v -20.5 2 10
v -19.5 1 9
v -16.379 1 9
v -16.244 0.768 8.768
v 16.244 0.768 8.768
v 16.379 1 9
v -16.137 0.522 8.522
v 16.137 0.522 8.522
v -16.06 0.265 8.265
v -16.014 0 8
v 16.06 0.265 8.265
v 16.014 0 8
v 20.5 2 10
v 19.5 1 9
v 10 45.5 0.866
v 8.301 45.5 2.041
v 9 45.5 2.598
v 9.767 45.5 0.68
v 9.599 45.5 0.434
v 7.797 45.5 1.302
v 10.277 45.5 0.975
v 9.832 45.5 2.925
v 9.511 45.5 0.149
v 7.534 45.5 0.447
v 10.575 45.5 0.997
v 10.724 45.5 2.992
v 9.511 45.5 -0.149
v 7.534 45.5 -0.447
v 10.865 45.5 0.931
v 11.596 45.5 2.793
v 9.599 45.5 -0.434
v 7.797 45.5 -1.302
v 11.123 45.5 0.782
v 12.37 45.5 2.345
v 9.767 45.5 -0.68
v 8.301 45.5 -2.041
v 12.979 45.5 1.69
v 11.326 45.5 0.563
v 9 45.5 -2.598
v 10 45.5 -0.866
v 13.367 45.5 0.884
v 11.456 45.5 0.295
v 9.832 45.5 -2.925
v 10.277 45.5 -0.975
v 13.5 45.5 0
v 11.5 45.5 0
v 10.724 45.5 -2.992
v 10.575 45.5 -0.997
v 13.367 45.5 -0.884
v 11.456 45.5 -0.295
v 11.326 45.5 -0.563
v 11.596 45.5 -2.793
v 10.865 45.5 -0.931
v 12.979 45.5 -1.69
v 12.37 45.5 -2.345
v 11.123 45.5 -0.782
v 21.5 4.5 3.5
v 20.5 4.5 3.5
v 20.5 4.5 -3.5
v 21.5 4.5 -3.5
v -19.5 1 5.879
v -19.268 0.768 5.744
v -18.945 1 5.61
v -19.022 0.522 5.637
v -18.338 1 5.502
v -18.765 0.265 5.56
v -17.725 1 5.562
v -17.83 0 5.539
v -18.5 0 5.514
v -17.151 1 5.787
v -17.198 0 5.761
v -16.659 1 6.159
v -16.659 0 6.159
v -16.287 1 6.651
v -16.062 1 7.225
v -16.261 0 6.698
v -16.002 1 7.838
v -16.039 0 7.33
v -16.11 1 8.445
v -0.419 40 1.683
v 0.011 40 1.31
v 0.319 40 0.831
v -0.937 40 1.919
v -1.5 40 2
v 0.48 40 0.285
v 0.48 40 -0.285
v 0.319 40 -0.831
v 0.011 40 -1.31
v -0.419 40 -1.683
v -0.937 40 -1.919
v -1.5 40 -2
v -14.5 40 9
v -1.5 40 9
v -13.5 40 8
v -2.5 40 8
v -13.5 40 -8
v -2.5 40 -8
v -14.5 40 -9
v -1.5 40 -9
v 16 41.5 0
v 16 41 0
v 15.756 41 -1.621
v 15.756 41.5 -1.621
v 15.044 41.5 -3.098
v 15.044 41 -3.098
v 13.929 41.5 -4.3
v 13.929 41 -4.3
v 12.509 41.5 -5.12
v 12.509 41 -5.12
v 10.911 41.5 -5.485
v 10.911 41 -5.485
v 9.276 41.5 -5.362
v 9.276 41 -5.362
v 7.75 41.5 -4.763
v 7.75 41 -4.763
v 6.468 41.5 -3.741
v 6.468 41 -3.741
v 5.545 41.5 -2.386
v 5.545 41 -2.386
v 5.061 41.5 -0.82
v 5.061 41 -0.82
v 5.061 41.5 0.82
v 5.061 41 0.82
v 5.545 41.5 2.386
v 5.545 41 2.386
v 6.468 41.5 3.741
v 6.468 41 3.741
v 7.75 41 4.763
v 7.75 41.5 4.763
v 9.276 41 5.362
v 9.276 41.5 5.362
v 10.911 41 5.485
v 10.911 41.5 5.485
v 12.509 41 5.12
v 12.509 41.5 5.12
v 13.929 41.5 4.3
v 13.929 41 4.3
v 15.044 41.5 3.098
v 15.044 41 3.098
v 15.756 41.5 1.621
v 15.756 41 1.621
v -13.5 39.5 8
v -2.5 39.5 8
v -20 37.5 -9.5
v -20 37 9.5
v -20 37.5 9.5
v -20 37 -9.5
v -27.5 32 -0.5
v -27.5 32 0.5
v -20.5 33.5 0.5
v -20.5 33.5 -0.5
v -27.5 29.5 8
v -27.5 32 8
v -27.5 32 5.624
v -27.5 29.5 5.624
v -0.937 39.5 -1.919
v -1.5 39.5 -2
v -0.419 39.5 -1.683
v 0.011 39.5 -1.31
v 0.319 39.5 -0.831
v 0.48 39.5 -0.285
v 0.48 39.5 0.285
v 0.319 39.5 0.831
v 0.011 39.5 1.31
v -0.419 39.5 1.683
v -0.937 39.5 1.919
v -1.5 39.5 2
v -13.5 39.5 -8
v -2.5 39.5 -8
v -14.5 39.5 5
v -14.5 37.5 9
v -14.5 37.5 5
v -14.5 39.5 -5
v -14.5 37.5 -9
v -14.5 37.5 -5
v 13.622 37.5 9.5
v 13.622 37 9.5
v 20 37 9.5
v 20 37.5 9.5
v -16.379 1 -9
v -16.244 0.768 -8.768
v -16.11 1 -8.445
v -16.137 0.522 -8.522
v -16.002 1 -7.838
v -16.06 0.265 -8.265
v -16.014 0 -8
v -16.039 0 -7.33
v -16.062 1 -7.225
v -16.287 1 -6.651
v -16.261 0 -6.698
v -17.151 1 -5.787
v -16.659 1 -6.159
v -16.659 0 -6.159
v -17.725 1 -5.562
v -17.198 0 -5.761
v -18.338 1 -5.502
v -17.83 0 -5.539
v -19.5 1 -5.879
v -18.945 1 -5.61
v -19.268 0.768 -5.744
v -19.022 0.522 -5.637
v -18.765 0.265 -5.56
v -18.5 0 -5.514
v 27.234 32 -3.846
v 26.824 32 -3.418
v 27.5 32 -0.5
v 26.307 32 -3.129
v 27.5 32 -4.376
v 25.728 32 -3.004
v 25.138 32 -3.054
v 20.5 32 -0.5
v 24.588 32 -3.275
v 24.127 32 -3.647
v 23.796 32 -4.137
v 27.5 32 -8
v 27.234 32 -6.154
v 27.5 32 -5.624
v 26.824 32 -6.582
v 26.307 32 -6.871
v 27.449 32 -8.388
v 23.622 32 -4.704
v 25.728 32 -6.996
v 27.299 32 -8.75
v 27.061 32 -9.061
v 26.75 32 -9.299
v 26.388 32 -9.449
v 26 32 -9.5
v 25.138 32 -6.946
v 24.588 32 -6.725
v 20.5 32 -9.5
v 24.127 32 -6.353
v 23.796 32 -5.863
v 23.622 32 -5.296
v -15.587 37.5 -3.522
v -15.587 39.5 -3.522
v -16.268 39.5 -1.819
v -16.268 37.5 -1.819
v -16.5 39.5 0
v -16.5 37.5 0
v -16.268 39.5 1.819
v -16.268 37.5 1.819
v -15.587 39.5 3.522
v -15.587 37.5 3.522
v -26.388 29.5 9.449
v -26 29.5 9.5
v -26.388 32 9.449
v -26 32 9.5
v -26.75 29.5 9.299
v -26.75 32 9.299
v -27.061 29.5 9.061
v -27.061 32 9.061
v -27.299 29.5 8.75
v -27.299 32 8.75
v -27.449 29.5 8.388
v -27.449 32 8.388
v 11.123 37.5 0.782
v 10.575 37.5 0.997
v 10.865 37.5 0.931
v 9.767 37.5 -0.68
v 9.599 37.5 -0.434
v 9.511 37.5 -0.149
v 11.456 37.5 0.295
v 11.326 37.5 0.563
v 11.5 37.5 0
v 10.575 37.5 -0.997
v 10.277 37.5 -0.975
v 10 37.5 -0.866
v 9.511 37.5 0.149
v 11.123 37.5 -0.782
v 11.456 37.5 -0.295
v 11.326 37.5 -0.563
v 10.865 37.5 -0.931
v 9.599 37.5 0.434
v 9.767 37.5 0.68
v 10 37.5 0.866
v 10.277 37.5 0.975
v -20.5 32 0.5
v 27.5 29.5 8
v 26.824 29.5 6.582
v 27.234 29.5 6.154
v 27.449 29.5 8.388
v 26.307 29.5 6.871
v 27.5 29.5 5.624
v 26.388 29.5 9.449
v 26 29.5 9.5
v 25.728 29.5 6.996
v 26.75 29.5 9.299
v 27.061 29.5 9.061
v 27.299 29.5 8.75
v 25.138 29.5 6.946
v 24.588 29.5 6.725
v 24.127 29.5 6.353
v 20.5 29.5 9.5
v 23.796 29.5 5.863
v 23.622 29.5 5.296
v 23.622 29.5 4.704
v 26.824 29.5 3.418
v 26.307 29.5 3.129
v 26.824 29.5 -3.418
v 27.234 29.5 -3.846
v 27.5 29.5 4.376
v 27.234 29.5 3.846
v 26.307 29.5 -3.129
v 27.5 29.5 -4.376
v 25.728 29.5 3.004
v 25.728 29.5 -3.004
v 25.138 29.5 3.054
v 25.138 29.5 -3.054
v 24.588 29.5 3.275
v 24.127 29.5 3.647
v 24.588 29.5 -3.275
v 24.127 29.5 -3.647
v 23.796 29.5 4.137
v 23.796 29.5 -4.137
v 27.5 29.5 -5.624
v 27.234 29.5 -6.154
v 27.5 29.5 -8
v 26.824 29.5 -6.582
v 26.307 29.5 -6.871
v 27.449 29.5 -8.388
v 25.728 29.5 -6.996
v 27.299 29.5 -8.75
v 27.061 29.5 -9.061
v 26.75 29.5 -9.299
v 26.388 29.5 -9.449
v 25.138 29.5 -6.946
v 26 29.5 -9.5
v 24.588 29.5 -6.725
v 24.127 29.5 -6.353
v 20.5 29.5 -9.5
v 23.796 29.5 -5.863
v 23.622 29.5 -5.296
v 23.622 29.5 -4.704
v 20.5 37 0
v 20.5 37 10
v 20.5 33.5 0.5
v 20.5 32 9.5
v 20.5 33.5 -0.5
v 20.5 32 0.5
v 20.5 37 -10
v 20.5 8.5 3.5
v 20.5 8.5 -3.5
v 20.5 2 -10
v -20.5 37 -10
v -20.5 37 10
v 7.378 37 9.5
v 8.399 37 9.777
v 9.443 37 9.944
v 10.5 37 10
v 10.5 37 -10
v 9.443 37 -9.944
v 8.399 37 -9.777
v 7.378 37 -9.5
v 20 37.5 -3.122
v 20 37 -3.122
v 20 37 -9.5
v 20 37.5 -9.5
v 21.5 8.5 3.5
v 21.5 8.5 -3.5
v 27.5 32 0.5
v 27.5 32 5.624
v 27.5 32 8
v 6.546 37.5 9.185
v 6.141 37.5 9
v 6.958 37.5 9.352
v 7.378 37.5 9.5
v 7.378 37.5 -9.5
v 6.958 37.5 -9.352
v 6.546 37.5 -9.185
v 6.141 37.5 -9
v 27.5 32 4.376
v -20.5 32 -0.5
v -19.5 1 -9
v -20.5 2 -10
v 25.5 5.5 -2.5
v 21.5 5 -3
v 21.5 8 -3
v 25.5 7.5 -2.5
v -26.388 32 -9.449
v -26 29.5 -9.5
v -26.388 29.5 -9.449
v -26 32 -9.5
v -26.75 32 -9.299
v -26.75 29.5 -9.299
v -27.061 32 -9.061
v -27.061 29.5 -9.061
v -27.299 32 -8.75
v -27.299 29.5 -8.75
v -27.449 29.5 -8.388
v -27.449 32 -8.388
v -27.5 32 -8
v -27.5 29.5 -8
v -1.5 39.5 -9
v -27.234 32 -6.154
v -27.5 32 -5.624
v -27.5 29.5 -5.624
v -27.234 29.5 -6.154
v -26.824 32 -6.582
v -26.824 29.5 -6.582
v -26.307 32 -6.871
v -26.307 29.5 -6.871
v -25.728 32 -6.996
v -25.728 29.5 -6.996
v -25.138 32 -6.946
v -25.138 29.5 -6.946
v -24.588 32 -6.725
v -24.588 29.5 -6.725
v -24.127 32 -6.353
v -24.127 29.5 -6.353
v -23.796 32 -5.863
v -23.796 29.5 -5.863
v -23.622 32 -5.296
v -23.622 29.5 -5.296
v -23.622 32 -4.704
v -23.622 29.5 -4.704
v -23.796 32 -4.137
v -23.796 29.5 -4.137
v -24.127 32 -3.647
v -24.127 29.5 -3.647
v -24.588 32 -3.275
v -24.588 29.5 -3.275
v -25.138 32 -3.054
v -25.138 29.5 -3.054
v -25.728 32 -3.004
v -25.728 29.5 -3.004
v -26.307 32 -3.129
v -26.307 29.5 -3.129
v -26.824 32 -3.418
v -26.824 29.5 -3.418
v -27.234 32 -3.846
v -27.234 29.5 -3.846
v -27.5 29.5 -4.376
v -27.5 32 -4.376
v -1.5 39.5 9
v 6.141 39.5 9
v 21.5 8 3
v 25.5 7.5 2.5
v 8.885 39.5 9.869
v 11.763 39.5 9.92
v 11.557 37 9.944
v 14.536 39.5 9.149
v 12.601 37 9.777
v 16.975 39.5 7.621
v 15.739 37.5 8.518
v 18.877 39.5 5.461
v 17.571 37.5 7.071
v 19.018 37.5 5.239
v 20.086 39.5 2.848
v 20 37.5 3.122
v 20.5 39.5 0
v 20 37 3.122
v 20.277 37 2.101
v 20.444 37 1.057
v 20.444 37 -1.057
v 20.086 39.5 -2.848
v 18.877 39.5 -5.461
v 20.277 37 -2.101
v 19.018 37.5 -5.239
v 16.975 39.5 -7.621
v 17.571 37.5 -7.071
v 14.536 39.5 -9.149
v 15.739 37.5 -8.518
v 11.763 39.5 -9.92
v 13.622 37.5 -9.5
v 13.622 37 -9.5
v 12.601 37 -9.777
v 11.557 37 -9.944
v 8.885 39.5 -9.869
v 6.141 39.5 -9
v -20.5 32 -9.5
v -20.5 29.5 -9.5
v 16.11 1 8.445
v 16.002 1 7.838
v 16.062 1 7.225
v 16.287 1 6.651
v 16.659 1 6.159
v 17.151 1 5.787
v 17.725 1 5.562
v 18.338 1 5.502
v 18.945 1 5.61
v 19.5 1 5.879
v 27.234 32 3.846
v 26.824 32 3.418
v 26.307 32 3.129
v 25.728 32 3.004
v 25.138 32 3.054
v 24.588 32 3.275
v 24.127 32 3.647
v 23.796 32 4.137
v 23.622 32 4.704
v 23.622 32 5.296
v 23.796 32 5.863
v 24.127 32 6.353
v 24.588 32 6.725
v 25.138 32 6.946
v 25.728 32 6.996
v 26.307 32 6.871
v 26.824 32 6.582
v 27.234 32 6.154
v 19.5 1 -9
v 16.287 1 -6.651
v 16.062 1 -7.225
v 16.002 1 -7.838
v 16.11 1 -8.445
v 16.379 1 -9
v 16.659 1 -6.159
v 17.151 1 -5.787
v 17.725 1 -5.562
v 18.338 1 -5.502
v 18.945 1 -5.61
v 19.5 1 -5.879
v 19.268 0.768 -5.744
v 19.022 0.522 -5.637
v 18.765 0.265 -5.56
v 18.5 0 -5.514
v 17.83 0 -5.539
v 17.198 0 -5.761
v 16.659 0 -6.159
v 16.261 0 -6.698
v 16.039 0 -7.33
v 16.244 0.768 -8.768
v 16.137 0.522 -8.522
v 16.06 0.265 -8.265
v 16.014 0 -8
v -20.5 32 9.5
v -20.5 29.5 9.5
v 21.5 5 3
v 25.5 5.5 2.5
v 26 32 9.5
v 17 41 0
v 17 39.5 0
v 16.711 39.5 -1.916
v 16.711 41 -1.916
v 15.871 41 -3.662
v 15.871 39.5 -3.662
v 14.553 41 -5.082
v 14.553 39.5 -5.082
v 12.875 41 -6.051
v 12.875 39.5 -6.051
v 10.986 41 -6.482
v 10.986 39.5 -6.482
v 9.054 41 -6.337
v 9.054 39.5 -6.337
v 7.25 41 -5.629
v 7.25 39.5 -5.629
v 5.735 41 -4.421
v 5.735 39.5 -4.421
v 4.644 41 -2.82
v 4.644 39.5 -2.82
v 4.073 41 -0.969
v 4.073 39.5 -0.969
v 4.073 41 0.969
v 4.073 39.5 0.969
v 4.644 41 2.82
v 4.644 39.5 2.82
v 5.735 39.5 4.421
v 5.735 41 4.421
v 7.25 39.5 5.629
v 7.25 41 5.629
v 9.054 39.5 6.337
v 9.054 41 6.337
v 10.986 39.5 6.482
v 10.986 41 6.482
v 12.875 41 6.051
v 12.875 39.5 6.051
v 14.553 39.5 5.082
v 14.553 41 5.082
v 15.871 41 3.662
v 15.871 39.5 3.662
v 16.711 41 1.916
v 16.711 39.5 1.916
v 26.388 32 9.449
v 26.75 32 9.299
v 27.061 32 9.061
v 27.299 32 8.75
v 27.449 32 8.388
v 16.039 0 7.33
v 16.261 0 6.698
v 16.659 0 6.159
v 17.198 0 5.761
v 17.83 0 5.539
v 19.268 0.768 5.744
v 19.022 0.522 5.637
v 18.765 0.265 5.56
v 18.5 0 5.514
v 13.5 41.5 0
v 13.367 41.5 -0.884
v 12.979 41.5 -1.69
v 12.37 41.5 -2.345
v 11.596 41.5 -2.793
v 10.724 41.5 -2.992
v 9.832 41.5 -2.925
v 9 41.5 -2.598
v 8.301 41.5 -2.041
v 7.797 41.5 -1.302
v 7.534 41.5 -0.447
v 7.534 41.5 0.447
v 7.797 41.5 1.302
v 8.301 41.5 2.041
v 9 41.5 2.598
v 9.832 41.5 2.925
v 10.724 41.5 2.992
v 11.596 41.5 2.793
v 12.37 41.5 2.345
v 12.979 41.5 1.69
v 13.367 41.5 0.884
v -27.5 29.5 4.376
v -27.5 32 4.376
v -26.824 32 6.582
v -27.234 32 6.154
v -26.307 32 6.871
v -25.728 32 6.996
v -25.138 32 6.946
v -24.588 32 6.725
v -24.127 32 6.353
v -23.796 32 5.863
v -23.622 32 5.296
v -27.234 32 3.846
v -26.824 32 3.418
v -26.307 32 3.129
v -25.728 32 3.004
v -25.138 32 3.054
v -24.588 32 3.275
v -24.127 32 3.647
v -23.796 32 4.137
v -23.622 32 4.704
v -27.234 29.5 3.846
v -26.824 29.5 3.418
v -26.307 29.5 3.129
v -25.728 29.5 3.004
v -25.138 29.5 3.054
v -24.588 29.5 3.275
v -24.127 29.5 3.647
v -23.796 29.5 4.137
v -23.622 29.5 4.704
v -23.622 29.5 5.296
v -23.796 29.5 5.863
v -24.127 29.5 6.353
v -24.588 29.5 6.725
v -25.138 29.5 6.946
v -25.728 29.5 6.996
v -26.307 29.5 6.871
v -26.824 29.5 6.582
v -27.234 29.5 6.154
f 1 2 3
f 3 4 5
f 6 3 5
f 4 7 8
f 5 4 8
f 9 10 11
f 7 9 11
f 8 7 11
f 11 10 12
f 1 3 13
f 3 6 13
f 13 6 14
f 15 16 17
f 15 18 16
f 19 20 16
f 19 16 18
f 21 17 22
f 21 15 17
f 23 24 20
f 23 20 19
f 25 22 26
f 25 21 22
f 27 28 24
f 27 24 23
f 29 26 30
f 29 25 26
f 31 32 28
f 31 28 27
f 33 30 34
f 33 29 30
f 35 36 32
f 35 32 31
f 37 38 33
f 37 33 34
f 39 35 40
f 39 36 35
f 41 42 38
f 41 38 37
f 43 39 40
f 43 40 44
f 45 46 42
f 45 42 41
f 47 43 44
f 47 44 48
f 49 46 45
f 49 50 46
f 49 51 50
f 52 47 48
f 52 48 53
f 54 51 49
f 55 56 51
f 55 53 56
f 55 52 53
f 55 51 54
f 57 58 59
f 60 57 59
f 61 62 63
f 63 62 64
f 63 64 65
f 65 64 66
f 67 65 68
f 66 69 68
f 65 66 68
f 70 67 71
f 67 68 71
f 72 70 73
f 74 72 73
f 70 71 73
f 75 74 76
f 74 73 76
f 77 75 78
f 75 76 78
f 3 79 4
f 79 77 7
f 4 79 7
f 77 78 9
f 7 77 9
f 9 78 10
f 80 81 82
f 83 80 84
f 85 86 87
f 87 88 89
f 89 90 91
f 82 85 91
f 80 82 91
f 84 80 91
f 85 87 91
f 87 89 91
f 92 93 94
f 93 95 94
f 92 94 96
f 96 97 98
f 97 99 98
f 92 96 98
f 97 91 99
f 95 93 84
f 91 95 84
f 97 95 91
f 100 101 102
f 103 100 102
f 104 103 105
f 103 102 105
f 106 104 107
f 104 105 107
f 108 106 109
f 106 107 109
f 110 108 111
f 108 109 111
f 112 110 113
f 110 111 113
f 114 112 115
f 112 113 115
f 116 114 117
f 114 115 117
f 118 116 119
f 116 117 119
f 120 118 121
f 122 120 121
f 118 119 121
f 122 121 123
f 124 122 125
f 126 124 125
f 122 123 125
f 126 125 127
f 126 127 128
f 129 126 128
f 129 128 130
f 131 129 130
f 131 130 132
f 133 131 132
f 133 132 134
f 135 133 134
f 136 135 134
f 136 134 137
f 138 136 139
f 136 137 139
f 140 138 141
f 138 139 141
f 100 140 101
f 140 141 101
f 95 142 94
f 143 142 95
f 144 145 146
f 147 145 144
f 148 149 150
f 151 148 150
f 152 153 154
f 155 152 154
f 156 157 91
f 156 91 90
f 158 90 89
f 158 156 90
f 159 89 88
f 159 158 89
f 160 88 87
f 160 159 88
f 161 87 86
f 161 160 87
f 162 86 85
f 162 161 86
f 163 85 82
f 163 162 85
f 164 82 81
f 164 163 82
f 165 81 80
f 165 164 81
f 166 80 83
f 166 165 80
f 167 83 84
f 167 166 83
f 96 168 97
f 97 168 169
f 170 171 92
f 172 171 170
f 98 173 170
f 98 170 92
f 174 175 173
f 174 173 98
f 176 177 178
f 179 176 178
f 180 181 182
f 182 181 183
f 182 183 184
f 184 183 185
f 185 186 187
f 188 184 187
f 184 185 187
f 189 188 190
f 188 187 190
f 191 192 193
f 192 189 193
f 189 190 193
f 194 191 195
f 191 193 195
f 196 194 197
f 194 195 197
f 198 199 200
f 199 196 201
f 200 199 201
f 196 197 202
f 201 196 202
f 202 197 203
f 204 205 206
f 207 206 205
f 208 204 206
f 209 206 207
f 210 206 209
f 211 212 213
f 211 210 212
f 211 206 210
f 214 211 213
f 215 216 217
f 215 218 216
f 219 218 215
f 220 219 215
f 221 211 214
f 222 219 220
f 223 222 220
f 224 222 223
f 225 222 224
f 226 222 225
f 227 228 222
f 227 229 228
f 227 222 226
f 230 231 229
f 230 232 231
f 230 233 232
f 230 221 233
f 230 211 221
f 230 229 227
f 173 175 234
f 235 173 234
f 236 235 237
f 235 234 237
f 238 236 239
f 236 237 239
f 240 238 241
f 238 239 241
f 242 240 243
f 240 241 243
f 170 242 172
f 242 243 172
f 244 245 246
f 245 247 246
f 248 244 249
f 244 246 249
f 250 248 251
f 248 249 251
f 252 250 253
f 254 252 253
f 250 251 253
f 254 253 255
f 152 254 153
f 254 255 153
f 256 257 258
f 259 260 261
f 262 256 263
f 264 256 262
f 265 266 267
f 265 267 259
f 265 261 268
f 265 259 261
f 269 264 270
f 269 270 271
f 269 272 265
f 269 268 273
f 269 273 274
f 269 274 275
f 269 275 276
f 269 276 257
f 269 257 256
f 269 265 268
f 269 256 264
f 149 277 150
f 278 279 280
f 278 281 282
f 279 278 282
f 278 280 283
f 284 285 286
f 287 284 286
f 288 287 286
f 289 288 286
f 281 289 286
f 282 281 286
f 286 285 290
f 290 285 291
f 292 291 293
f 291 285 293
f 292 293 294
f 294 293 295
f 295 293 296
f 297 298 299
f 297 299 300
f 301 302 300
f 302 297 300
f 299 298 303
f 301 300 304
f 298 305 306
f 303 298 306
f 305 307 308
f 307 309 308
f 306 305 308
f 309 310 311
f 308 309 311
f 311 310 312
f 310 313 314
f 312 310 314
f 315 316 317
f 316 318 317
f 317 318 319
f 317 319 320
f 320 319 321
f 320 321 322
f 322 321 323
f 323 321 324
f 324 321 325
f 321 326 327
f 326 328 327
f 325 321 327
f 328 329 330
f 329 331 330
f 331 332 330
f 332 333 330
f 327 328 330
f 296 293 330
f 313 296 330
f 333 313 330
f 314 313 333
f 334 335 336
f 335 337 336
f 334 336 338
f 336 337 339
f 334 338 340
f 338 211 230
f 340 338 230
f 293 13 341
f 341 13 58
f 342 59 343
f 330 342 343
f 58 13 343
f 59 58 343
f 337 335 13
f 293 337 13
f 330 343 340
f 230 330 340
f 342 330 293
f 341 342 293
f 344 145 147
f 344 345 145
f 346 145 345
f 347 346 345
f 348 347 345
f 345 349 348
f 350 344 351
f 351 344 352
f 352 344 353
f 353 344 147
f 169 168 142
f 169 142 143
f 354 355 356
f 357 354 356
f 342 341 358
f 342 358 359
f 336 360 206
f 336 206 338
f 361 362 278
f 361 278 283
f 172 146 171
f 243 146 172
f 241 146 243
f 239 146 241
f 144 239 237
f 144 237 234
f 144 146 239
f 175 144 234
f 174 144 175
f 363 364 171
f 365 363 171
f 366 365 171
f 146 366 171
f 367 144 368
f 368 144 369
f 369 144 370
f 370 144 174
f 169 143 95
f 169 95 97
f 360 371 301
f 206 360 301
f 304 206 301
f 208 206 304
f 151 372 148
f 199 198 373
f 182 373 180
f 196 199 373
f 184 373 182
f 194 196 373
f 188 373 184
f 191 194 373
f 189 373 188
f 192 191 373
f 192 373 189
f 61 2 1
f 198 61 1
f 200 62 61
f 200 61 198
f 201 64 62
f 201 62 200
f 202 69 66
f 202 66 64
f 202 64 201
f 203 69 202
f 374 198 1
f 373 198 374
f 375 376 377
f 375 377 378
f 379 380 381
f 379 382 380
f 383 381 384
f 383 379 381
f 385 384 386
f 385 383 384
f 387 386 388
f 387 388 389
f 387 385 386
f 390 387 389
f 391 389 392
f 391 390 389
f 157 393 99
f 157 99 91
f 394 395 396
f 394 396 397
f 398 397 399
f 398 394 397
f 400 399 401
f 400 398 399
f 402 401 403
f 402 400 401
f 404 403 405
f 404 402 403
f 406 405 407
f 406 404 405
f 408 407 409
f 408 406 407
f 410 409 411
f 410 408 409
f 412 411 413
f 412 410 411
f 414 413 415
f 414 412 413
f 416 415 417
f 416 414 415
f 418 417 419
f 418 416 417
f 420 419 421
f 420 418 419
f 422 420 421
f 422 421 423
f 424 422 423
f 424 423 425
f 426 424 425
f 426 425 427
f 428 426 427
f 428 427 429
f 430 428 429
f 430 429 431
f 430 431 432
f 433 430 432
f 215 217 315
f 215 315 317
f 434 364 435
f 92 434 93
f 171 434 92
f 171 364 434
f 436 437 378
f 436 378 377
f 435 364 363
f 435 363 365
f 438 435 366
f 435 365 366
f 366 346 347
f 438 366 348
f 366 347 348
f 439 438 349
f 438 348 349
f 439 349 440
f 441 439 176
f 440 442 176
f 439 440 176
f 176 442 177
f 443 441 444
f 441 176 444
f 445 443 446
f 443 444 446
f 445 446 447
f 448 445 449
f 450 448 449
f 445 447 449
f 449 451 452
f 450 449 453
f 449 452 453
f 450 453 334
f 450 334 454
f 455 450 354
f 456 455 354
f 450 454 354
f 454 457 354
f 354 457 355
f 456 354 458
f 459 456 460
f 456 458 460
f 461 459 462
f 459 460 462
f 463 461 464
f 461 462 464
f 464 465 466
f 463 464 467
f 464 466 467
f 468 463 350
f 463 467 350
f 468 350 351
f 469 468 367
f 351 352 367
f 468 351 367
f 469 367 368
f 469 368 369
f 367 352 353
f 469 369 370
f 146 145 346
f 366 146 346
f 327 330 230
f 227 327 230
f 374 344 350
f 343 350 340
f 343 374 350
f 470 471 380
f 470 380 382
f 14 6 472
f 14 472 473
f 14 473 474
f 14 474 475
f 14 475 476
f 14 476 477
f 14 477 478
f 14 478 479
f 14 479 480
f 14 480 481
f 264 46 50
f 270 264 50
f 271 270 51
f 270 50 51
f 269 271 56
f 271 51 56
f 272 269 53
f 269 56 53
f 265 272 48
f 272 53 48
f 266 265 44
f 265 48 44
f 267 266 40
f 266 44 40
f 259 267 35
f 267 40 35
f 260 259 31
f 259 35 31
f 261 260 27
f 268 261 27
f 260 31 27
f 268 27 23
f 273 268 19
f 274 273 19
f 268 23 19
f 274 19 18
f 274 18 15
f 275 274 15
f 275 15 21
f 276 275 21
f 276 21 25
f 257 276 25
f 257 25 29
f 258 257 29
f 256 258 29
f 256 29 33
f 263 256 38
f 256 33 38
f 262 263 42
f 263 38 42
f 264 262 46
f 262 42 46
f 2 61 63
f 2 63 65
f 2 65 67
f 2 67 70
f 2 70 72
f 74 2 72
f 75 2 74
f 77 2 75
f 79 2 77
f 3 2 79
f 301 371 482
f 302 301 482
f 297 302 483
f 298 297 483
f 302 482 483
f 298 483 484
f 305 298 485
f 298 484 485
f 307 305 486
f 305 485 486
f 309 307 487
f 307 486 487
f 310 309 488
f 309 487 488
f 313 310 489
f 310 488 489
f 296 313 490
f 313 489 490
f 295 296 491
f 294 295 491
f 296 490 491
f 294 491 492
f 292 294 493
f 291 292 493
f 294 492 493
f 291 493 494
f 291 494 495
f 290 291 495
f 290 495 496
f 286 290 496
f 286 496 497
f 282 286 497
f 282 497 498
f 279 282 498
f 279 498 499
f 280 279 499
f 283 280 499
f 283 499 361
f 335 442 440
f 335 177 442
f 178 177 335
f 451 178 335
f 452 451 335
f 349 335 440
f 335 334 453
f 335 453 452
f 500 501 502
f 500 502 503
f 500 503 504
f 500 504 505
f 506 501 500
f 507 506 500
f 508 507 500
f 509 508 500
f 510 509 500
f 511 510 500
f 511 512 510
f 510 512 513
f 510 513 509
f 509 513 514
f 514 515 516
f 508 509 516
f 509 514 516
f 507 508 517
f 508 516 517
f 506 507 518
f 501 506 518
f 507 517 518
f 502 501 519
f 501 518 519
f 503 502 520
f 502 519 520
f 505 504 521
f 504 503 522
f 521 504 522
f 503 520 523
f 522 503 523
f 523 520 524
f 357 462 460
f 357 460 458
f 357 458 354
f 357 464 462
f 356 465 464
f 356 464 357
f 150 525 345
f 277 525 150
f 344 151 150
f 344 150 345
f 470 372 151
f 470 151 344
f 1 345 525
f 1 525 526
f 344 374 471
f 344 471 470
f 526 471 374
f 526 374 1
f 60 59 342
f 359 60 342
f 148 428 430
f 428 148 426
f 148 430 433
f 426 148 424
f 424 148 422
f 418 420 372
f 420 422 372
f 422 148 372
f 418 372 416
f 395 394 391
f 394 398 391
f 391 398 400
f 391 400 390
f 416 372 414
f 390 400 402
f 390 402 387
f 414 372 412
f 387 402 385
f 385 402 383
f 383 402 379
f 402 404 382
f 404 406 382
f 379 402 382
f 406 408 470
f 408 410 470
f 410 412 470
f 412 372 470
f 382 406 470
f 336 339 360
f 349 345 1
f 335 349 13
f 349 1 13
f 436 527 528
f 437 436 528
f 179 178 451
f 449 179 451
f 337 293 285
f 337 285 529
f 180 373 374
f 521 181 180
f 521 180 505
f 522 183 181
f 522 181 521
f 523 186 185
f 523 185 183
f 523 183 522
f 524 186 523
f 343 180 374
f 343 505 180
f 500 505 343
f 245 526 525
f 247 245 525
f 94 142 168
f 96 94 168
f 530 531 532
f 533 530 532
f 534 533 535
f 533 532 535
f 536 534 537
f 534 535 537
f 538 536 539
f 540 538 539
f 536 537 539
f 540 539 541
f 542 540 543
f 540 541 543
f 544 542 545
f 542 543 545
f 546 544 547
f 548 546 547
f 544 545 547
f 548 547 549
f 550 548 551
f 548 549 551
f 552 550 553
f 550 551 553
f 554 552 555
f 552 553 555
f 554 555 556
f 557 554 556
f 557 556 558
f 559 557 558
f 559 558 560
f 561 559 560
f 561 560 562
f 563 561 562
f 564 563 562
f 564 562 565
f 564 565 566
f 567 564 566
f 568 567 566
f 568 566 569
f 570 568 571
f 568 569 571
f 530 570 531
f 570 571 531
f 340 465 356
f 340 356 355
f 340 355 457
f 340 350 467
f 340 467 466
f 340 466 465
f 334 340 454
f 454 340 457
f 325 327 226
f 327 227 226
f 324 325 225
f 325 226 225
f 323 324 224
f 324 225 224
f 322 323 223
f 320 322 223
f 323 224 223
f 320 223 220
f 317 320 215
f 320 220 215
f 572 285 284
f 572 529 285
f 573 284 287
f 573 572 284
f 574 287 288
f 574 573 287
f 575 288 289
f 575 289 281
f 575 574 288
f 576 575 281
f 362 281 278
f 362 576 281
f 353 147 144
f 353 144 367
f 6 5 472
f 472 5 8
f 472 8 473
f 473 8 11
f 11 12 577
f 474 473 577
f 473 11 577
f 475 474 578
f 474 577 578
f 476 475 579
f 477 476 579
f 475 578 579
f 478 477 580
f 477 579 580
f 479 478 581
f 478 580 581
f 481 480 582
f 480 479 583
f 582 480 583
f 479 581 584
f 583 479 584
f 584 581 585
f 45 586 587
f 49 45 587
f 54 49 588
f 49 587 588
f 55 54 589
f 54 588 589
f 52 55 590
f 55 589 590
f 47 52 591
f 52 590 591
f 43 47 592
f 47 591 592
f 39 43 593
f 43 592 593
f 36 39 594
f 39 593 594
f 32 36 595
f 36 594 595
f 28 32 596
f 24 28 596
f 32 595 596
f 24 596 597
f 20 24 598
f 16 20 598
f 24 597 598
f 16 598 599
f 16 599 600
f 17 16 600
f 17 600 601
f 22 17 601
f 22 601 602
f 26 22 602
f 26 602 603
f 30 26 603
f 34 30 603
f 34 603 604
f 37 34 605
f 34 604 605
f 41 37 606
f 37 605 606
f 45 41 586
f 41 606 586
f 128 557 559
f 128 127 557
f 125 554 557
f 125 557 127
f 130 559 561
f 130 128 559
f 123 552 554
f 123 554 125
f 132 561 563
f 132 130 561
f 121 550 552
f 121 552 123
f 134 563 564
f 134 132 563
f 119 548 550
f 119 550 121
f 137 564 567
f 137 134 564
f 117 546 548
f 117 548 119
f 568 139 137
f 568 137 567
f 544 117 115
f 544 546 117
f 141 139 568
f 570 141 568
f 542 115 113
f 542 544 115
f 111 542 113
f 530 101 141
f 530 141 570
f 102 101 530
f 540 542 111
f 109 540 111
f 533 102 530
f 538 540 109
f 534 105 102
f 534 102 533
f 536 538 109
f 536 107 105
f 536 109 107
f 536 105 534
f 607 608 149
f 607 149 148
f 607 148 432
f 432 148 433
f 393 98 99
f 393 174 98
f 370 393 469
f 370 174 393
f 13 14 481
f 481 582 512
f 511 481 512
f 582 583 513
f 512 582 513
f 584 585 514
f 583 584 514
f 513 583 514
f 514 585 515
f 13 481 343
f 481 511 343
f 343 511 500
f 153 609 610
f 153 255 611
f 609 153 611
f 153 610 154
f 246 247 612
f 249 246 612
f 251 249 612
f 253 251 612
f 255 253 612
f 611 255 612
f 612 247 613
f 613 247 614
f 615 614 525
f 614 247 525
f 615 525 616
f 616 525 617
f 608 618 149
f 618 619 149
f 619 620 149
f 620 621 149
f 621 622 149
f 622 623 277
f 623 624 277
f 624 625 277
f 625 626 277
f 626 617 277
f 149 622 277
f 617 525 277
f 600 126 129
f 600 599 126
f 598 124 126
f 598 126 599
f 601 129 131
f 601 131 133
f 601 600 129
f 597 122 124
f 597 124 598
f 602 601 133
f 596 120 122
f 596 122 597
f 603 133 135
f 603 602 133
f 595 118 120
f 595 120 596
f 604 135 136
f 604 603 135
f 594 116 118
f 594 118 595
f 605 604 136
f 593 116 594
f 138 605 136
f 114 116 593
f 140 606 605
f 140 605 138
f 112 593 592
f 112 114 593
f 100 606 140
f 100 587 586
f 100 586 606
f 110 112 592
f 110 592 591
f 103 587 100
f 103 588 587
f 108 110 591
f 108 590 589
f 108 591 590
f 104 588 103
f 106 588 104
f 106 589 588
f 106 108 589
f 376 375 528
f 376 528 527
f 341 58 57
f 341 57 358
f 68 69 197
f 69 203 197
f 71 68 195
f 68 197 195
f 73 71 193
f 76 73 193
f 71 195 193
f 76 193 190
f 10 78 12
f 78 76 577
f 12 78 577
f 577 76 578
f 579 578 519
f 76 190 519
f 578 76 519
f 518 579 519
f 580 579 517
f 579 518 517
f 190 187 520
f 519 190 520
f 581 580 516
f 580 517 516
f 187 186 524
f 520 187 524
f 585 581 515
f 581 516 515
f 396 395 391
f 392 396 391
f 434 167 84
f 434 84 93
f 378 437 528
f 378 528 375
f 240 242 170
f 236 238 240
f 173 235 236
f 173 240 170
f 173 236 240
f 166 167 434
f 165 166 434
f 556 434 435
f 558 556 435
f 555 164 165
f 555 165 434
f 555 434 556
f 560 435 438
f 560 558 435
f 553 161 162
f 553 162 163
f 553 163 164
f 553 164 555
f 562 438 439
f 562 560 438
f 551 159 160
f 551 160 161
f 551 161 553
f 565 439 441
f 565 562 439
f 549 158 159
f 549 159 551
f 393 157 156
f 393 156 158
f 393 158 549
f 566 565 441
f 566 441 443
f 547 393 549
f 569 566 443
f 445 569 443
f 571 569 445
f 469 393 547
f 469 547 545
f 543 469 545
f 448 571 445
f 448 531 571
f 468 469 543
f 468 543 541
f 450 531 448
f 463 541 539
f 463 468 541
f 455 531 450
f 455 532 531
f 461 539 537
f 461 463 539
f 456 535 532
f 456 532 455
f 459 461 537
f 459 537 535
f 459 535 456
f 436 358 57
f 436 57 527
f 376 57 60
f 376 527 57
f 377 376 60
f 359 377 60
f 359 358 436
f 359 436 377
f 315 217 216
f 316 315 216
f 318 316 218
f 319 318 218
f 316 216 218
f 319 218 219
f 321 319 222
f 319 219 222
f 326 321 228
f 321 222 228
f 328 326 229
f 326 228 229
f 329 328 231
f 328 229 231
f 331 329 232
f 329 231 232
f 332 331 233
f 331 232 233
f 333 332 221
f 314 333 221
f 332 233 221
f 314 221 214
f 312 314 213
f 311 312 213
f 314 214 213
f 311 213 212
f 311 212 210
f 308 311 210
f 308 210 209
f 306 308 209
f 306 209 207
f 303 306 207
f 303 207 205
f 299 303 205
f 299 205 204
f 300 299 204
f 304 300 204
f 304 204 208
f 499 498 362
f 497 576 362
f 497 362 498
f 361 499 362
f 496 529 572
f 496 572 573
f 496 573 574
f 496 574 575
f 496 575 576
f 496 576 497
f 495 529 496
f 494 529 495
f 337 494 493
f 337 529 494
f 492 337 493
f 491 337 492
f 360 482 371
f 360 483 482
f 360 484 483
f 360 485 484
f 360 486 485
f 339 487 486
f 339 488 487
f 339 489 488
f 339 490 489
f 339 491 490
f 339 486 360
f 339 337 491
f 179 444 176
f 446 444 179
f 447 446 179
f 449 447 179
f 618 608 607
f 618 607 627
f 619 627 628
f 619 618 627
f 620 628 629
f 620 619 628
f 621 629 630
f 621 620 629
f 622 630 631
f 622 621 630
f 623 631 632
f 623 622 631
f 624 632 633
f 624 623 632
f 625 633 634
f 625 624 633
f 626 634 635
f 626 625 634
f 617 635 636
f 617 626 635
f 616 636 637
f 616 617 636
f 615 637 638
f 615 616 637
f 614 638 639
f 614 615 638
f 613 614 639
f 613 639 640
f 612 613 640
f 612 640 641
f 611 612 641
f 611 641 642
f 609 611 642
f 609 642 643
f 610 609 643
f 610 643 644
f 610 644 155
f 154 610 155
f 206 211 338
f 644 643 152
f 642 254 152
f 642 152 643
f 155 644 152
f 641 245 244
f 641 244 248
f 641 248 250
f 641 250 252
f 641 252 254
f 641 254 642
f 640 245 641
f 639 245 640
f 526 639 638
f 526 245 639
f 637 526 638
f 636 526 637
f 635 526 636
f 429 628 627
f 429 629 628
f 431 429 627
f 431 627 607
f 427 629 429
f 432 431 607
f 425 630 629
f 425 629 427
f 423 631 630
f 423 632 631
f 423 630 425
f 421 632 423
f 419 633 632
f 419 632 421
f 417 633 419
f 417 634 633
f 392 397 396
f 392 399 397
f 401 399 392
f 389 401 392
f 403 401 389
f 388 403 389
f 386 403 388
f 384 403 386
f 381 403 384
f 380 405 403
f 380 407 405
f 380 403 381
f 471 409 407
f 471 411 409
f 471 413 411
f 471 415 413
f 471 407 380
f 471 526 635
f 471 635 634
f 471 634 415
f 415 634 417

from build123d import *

# Parameters (mm, degrees)
SKETCH1_W            = 41
SKETCH1_H            = 20
BOSS_EXTRUDE1_DEPTH  = 40
CHAMFER1_SIZE        = 2
SKETCH2_R            = 2.25
CUT_EXTRUDE1_DEPTH   = 1
SKETCH3_W            = 19
SKETCH3_H            = 2.5
BOSS_EXTRUDE2_DEPTH  = 7
FILLET1_R            = 1.5
SKETCH4_W            = 7
SKETCH4_H            = 1
BOSS_EXTRUDE3_DEPTH  = 1.5
CUT_EXTRUDE2_DEPTH   = 1
SKETCH6_R            = 2
CUT_EXTRUDE3_DEPTH   = 2.5
FILLET1_OF_MIRROR1_R = 1.5
SKETCH7_W            = 41
SKETCH7_H            = 20
CUT_EXTRUDE4_DEPTH   = 3
SKETCH8_W            = 40
SKETCH8_H            = 19
BOSS_EXTRUDE4_DEPTH  = 0.5
BOSS_EXTRUDE6_DEPTH  = 2.5
SKETCH10_W           = 11
SKETCH10_H           = 16
BOSS_EXTRUDE7_DEPTH  = 0.5
SKETCH11_R           = 6.5
BOSS_EXTRUDE8_DEPTH  = 1.5
SKETCH12_R           = 5.5
BOSS_EXTRUDE9_DEPTH  = 0.5
SKETCH13_R           = 3
BOSS_EXTRUDE10_DEPTH = 4
SKETCH14_R           = 1
CUT_EXTRUDE5_DEPTH   = 8
SKETCH15_W           = 7
SKETCH15_H           = 4
BOSS_EXTRUDE11_DEPTH = 5
SKETCH16_W           = 7
SKETCH16_H           = 4
SKETCH16_W_2         = 6
SKETCH16_H_2         = 3
CUT_EXTRUDE6_DEPTH   = 4
CUT_EXTRUDE7_DEPTH   = 3
CUT_EXTRUDE8_DEPTH   = 7


with BuildPart() as part:
    # Sketch1 → Boss-Extrude1 (new body)
    with BuildSketch(Plane(origin=(0, 0, 0), x_dir=(1, 0, 0), z_dir=(0, 1, 0))):
        Rectangle(SKETCH1_W, SKETCH1_H)
    extrude(amount=BOSS_EXTRUDE1_DEPTH)

    # Chamfer1
    chamfer1_edges = [part.edges().sort_by_distance(p)[0] for p in [
        (0, 0, 10),
        (-20.5, 0, 0),
        (0, 0, -10),
        (20.5, 0, 0),
    ]]
    chamfer(chamfer1_edges, length=CHAMFER1_SIZE)

    # Sketch2 → Cut-Extrude1 (cut)
    with BuildSketch(Plane.XZ):
        with Locations((18.25, 7.75)):
            Circle(SKETCH2_R)
        with Locations((-18.25, 7.75)):
            Circle(SKETCH2_R)
        with Locations((-18.25, -7.75)):
            Circle(SKETCH2_R)
        with Locations((18.25, -7.75)):
            Circle(SKETCH2_R)
    extrude(amount=-CUT_EXTRUDE1_DEPTH, mode=Mode.SUBTRACT)

    # Sketch3 → Boss-Extrude2 (add)
    with BuildSketch(Plane(origin=(20.5, 0, 0), x_dir=(0, 0, -1), z_dir=(1, 0, 0))):
        with Locations((0, 30.75)):
            Rectangle(SKETCH3_W, SKETCH3_H)
    boss_extrude2 = extrude(amount=BOSS_EXTRUDE2_DEPTH)

    # Fillet1
    fillet1_edges = [part.edges().sort_by_distance(p)[0] for p in [
        (27.5, 30.75, 9.5),
        (27.5, 30.75, -9.5),
    ]]
    fillet(fillet1_edges, radius=FILLET1_R)

    # Sketch4 → Boss-Extrude3 (add)
    with BuildSketch(Plane(origin=(0, 32, 0), x_dir=(1, 0, 0), z_dir=(0, 1, 0))):
        with Locations((24, 0)):
            Rectangle(SKETCH4_W, SKETCH4_H)
    boss_extrude3 = extrude(amount=BOSS_EXTRUDE3_DEPTH)

    # Sketch5 → Cut-Extrude2 (cut)
    with BuildSketch(Plane.XY.offset(0.5)):
        Polygon((27.5, 33.5), (27.5, 32), (20.5, 33.5), align=None)
    cut_extrude2 = extrude(amount=-CUT_EXTRUDE2_DEPTH, mode=Mode.SUBTRACT)

    # Sketch6 → Cut-Extrude3 (cut)
    with BuildSketch(Plane(origin=(0, 32, 0), x_dir=(1, 0, 0), z_dir=(0, 1, 0))):
        with Locations((25.6, 5)):
            Circle(SKETCH6_R)
        with Locations((25.6, -5)):
            Circle(SKETCH6_R)
    cut_extrude3 = extrude(amount=-CUT_EXTRUDE3_DEPTH, mode=Mode.SUBTRACT)

    # Mirror1: Boss-Extrude2, Boss-Extrude3, Cut-Extrude2, Cut-Extrude3 across plane
    add(boss_extrude2.mirror(Plane(origin=(0, 0, 0), x_dir=(0, 0, 1), z_dir=(1, 0, 0))))
    add(boss_extrude3.mirror(Plane(origin=(0, 0, 0), x_dir=(0, 0, 1), z_dir=(1, 0, 0))))
    add(cut_extrude2.mirror(Plane(origin=(0, 0, 0), x_dir=(0, 0, 1), z_dir=(1, 0, 0))), mode=Mode.SUBTRACT)
    add(cut_extrude3.mirror(Plane(origin=(0, 0, 0), x_dir=(0, 0, 1), z_dir=(1, 0, 0))), mode=Mode.SUBTRACT)

    # Fillet1 of Mirror1
    fillet1_of_mirror1_edges = [part.edges().sort_by_distance(p)[0] for p in [
        (-27.5, 30.75, 9.5),
        (-27.5, 30.75, -9.5),
    ]]
    fillet(fillet1_of_mirror1_edges, radius=FILLET1_OF_MIRROR1_R)

    # Sketch7 → Cut-Extrude4 (cut)
    with BuildSketch(Plane(origin=(0, 40, 0), x_dir=(1, 0, 0), z_dir=(0, 1, 0))):
        Rectangle(SKETCH7_W, SKETCH7_H)
    extrude(amount=-CUT_EXTRUDE4_DEPTH, mode=Mode.SUBTRACT)

    # Sketch8 → Boss-Extrude4 (add)
    with BuildSketch(Plane(origin=(0, 37, 0), x_dir=(1, 0, 0), z_dir=(0, 1, 0))):
        Rectangle(SKETCH8_W, SKETCH8_H)
    extrude(amount=BOSS_EXTRUDE4_DEPTH)

    # Sketch9 → Boss-Extrude6 (add)
    with BuildSketch(Plane(origin=(0, 37, 0), x_dir=(1, 0, 0), z_dir=(0, 1, 0))):
        with BuildLine():
            Line((6.141101056, 9), (-14.5, 9))
            Line((-14.5, 9), (-14.5, 5))
            ThreePointArc((-14.5, 5), (-16.5, 0), (-14.5, -5))
            Line((-14.5, -5), (-14.5, -9))
            Line((-14.5, -9), (6.141101056, -9))
            ThreePointArc((6.141101056, -9), (20.5, 0), (6.141101056, 9))
        make_face()
    extrude(amount=BOSS_EXTRUDE6_DEPTH)

    # Sketch10 → Boss-Extrude7 (add)
    with BuildSketch(Plane(origin=(0, 39.5, 0), x_dir=(1, 0, 0), z_dir=(0, 1, 0))):
        with BuildLine():
            Line((-14.5, 9), (-1.5, 9))
            Line((-1.5, 9), (-1.5, 2))
            ThreePointArc((-1.5, 2), (0.5, 0), (-1.5, -2))
            Line((-1.5, -2), (-1.5, -9))
            Line((-1.5, -9), (-14.5, -9))
            Line((-14.5, -9), (-14.5, 9))
        make_face()
        with Locations((-8, 0)):
            Rectangle(SKETCH10_W, SKETCH10_H, mode=Mode.SUBTRACT)
    extrude(amount=BOSS_EXTRUDE7_DEPTH)

    # Sketch11 → Boss-Extrude8 (add)
    with BuildSketch(Plane(origin=(0, 39.5, 0), x_dir=(1, 0, 0), z_dir=(0, 1, 0))):
        with Locations((10.5, 0)):
            Circle(SKETCH11_R)
    extrude(amount=BOSS_EXTRUDE8_DEPTH)

    # Sketch12 → Boss-Extrude9 (add)
    with BuildSketch(Plane(origin=(0, 41, 0), x_dir=(1, 0, 0), z_dir=(0, 1, 0))):
        with Locations((10.5, 0)):
            Circle(SKETCH12_R)
    extrude(amount=BOSS_EXTRUDE9_DEPTH)

    # Sketch13 → Boss-Extrude10 (add)
    with BuildSketch(Plane(origin=(0, 41.5, 0), x_dir=(1, 0, 0), z_dir=(0, 1, 0))):
        with Locations((10.5, 0)):
            Circle(SKETCH13_R)
    extrude(amount=BOSS_EXTRUDE10_DEPTH)

    # Sketch14 → Cut-Extrude5 (cut)
    with BuildSketch(Plane(origin=(0, 45.5, 0), x_dir=(1, 0, 0), z_dir=(0, 1, 0))):
        with Locations((10.5, 0)):
            Circle(SKETCH14_R)
    extrude(amount=-CUT_EXTRUDE5_DEPTH, mode=Mode.SUBTRACT)

    # Sketch15 → Boss-Extrude11 (add)
    with BuildSketch(Plane(origin=(20.5, 0, 0), x_dir=(0, 0, -1), z_dir=(1, 0, 0))):
        with Locations((0, 6.5)):
            Rectangle(SKETCH15_W, SKETCH15_H)
    extrude(amount=BOSS_EXTRUDE11_DEPTH)

    # Sketch16 → Cut-Extrude6 (cut)
    with BuildSketch(Plane(origin=(25.5, 0, 0), x_dir=(0, 0, -1), z_dir=(1, 0, 0))):
        with Locations((0, 6.5)):
            Rectangle(SKETCH16_W, SKETCH16_H)
        with Locations((0, 6.5)):
            Rectangle(SKETCH16_W_2, SKETCH16_H_2, mode=Mode.SUBTRACT)
    extrude(amount=-CUT_EXTRUDE6_DEPTH, mode=Mode.SUBTRACT)

    # Sketch17 → Cut-Extrude7 (cut)
    with BuildSketch(Plane.XZ.offset(-5)):
        Polygon((21.5, 3), (25.5, 2.5), (25.5, 3), align=None)
        Polygon((21.5, -3), (25.5, -2.5), (25.5, -3), align=None)
    extrude(amount=-CUT_EXTRUDE7_DEPTH, mode=Mode.SUBTRACT)

    # Sketch18 → Cut-Extrude8 (cut)
    with BuildSketch(Plane(origin=(0, 0, -3.5), x_dir=(-1, 0, 0), z_dir=(0, 0, -1))):
        Polygon((-21.5, 8), (-25.5, 8), (-25.5, 7.5), align=None)
        Polygon((-21.5, 5), (-25.5, 5), (-25.5, 5.5), align=None)
    extrude(amount=-CUT_EXTRUDE8_DEPTH, mode=Mode.SUBTRACT)


solid = part.part
